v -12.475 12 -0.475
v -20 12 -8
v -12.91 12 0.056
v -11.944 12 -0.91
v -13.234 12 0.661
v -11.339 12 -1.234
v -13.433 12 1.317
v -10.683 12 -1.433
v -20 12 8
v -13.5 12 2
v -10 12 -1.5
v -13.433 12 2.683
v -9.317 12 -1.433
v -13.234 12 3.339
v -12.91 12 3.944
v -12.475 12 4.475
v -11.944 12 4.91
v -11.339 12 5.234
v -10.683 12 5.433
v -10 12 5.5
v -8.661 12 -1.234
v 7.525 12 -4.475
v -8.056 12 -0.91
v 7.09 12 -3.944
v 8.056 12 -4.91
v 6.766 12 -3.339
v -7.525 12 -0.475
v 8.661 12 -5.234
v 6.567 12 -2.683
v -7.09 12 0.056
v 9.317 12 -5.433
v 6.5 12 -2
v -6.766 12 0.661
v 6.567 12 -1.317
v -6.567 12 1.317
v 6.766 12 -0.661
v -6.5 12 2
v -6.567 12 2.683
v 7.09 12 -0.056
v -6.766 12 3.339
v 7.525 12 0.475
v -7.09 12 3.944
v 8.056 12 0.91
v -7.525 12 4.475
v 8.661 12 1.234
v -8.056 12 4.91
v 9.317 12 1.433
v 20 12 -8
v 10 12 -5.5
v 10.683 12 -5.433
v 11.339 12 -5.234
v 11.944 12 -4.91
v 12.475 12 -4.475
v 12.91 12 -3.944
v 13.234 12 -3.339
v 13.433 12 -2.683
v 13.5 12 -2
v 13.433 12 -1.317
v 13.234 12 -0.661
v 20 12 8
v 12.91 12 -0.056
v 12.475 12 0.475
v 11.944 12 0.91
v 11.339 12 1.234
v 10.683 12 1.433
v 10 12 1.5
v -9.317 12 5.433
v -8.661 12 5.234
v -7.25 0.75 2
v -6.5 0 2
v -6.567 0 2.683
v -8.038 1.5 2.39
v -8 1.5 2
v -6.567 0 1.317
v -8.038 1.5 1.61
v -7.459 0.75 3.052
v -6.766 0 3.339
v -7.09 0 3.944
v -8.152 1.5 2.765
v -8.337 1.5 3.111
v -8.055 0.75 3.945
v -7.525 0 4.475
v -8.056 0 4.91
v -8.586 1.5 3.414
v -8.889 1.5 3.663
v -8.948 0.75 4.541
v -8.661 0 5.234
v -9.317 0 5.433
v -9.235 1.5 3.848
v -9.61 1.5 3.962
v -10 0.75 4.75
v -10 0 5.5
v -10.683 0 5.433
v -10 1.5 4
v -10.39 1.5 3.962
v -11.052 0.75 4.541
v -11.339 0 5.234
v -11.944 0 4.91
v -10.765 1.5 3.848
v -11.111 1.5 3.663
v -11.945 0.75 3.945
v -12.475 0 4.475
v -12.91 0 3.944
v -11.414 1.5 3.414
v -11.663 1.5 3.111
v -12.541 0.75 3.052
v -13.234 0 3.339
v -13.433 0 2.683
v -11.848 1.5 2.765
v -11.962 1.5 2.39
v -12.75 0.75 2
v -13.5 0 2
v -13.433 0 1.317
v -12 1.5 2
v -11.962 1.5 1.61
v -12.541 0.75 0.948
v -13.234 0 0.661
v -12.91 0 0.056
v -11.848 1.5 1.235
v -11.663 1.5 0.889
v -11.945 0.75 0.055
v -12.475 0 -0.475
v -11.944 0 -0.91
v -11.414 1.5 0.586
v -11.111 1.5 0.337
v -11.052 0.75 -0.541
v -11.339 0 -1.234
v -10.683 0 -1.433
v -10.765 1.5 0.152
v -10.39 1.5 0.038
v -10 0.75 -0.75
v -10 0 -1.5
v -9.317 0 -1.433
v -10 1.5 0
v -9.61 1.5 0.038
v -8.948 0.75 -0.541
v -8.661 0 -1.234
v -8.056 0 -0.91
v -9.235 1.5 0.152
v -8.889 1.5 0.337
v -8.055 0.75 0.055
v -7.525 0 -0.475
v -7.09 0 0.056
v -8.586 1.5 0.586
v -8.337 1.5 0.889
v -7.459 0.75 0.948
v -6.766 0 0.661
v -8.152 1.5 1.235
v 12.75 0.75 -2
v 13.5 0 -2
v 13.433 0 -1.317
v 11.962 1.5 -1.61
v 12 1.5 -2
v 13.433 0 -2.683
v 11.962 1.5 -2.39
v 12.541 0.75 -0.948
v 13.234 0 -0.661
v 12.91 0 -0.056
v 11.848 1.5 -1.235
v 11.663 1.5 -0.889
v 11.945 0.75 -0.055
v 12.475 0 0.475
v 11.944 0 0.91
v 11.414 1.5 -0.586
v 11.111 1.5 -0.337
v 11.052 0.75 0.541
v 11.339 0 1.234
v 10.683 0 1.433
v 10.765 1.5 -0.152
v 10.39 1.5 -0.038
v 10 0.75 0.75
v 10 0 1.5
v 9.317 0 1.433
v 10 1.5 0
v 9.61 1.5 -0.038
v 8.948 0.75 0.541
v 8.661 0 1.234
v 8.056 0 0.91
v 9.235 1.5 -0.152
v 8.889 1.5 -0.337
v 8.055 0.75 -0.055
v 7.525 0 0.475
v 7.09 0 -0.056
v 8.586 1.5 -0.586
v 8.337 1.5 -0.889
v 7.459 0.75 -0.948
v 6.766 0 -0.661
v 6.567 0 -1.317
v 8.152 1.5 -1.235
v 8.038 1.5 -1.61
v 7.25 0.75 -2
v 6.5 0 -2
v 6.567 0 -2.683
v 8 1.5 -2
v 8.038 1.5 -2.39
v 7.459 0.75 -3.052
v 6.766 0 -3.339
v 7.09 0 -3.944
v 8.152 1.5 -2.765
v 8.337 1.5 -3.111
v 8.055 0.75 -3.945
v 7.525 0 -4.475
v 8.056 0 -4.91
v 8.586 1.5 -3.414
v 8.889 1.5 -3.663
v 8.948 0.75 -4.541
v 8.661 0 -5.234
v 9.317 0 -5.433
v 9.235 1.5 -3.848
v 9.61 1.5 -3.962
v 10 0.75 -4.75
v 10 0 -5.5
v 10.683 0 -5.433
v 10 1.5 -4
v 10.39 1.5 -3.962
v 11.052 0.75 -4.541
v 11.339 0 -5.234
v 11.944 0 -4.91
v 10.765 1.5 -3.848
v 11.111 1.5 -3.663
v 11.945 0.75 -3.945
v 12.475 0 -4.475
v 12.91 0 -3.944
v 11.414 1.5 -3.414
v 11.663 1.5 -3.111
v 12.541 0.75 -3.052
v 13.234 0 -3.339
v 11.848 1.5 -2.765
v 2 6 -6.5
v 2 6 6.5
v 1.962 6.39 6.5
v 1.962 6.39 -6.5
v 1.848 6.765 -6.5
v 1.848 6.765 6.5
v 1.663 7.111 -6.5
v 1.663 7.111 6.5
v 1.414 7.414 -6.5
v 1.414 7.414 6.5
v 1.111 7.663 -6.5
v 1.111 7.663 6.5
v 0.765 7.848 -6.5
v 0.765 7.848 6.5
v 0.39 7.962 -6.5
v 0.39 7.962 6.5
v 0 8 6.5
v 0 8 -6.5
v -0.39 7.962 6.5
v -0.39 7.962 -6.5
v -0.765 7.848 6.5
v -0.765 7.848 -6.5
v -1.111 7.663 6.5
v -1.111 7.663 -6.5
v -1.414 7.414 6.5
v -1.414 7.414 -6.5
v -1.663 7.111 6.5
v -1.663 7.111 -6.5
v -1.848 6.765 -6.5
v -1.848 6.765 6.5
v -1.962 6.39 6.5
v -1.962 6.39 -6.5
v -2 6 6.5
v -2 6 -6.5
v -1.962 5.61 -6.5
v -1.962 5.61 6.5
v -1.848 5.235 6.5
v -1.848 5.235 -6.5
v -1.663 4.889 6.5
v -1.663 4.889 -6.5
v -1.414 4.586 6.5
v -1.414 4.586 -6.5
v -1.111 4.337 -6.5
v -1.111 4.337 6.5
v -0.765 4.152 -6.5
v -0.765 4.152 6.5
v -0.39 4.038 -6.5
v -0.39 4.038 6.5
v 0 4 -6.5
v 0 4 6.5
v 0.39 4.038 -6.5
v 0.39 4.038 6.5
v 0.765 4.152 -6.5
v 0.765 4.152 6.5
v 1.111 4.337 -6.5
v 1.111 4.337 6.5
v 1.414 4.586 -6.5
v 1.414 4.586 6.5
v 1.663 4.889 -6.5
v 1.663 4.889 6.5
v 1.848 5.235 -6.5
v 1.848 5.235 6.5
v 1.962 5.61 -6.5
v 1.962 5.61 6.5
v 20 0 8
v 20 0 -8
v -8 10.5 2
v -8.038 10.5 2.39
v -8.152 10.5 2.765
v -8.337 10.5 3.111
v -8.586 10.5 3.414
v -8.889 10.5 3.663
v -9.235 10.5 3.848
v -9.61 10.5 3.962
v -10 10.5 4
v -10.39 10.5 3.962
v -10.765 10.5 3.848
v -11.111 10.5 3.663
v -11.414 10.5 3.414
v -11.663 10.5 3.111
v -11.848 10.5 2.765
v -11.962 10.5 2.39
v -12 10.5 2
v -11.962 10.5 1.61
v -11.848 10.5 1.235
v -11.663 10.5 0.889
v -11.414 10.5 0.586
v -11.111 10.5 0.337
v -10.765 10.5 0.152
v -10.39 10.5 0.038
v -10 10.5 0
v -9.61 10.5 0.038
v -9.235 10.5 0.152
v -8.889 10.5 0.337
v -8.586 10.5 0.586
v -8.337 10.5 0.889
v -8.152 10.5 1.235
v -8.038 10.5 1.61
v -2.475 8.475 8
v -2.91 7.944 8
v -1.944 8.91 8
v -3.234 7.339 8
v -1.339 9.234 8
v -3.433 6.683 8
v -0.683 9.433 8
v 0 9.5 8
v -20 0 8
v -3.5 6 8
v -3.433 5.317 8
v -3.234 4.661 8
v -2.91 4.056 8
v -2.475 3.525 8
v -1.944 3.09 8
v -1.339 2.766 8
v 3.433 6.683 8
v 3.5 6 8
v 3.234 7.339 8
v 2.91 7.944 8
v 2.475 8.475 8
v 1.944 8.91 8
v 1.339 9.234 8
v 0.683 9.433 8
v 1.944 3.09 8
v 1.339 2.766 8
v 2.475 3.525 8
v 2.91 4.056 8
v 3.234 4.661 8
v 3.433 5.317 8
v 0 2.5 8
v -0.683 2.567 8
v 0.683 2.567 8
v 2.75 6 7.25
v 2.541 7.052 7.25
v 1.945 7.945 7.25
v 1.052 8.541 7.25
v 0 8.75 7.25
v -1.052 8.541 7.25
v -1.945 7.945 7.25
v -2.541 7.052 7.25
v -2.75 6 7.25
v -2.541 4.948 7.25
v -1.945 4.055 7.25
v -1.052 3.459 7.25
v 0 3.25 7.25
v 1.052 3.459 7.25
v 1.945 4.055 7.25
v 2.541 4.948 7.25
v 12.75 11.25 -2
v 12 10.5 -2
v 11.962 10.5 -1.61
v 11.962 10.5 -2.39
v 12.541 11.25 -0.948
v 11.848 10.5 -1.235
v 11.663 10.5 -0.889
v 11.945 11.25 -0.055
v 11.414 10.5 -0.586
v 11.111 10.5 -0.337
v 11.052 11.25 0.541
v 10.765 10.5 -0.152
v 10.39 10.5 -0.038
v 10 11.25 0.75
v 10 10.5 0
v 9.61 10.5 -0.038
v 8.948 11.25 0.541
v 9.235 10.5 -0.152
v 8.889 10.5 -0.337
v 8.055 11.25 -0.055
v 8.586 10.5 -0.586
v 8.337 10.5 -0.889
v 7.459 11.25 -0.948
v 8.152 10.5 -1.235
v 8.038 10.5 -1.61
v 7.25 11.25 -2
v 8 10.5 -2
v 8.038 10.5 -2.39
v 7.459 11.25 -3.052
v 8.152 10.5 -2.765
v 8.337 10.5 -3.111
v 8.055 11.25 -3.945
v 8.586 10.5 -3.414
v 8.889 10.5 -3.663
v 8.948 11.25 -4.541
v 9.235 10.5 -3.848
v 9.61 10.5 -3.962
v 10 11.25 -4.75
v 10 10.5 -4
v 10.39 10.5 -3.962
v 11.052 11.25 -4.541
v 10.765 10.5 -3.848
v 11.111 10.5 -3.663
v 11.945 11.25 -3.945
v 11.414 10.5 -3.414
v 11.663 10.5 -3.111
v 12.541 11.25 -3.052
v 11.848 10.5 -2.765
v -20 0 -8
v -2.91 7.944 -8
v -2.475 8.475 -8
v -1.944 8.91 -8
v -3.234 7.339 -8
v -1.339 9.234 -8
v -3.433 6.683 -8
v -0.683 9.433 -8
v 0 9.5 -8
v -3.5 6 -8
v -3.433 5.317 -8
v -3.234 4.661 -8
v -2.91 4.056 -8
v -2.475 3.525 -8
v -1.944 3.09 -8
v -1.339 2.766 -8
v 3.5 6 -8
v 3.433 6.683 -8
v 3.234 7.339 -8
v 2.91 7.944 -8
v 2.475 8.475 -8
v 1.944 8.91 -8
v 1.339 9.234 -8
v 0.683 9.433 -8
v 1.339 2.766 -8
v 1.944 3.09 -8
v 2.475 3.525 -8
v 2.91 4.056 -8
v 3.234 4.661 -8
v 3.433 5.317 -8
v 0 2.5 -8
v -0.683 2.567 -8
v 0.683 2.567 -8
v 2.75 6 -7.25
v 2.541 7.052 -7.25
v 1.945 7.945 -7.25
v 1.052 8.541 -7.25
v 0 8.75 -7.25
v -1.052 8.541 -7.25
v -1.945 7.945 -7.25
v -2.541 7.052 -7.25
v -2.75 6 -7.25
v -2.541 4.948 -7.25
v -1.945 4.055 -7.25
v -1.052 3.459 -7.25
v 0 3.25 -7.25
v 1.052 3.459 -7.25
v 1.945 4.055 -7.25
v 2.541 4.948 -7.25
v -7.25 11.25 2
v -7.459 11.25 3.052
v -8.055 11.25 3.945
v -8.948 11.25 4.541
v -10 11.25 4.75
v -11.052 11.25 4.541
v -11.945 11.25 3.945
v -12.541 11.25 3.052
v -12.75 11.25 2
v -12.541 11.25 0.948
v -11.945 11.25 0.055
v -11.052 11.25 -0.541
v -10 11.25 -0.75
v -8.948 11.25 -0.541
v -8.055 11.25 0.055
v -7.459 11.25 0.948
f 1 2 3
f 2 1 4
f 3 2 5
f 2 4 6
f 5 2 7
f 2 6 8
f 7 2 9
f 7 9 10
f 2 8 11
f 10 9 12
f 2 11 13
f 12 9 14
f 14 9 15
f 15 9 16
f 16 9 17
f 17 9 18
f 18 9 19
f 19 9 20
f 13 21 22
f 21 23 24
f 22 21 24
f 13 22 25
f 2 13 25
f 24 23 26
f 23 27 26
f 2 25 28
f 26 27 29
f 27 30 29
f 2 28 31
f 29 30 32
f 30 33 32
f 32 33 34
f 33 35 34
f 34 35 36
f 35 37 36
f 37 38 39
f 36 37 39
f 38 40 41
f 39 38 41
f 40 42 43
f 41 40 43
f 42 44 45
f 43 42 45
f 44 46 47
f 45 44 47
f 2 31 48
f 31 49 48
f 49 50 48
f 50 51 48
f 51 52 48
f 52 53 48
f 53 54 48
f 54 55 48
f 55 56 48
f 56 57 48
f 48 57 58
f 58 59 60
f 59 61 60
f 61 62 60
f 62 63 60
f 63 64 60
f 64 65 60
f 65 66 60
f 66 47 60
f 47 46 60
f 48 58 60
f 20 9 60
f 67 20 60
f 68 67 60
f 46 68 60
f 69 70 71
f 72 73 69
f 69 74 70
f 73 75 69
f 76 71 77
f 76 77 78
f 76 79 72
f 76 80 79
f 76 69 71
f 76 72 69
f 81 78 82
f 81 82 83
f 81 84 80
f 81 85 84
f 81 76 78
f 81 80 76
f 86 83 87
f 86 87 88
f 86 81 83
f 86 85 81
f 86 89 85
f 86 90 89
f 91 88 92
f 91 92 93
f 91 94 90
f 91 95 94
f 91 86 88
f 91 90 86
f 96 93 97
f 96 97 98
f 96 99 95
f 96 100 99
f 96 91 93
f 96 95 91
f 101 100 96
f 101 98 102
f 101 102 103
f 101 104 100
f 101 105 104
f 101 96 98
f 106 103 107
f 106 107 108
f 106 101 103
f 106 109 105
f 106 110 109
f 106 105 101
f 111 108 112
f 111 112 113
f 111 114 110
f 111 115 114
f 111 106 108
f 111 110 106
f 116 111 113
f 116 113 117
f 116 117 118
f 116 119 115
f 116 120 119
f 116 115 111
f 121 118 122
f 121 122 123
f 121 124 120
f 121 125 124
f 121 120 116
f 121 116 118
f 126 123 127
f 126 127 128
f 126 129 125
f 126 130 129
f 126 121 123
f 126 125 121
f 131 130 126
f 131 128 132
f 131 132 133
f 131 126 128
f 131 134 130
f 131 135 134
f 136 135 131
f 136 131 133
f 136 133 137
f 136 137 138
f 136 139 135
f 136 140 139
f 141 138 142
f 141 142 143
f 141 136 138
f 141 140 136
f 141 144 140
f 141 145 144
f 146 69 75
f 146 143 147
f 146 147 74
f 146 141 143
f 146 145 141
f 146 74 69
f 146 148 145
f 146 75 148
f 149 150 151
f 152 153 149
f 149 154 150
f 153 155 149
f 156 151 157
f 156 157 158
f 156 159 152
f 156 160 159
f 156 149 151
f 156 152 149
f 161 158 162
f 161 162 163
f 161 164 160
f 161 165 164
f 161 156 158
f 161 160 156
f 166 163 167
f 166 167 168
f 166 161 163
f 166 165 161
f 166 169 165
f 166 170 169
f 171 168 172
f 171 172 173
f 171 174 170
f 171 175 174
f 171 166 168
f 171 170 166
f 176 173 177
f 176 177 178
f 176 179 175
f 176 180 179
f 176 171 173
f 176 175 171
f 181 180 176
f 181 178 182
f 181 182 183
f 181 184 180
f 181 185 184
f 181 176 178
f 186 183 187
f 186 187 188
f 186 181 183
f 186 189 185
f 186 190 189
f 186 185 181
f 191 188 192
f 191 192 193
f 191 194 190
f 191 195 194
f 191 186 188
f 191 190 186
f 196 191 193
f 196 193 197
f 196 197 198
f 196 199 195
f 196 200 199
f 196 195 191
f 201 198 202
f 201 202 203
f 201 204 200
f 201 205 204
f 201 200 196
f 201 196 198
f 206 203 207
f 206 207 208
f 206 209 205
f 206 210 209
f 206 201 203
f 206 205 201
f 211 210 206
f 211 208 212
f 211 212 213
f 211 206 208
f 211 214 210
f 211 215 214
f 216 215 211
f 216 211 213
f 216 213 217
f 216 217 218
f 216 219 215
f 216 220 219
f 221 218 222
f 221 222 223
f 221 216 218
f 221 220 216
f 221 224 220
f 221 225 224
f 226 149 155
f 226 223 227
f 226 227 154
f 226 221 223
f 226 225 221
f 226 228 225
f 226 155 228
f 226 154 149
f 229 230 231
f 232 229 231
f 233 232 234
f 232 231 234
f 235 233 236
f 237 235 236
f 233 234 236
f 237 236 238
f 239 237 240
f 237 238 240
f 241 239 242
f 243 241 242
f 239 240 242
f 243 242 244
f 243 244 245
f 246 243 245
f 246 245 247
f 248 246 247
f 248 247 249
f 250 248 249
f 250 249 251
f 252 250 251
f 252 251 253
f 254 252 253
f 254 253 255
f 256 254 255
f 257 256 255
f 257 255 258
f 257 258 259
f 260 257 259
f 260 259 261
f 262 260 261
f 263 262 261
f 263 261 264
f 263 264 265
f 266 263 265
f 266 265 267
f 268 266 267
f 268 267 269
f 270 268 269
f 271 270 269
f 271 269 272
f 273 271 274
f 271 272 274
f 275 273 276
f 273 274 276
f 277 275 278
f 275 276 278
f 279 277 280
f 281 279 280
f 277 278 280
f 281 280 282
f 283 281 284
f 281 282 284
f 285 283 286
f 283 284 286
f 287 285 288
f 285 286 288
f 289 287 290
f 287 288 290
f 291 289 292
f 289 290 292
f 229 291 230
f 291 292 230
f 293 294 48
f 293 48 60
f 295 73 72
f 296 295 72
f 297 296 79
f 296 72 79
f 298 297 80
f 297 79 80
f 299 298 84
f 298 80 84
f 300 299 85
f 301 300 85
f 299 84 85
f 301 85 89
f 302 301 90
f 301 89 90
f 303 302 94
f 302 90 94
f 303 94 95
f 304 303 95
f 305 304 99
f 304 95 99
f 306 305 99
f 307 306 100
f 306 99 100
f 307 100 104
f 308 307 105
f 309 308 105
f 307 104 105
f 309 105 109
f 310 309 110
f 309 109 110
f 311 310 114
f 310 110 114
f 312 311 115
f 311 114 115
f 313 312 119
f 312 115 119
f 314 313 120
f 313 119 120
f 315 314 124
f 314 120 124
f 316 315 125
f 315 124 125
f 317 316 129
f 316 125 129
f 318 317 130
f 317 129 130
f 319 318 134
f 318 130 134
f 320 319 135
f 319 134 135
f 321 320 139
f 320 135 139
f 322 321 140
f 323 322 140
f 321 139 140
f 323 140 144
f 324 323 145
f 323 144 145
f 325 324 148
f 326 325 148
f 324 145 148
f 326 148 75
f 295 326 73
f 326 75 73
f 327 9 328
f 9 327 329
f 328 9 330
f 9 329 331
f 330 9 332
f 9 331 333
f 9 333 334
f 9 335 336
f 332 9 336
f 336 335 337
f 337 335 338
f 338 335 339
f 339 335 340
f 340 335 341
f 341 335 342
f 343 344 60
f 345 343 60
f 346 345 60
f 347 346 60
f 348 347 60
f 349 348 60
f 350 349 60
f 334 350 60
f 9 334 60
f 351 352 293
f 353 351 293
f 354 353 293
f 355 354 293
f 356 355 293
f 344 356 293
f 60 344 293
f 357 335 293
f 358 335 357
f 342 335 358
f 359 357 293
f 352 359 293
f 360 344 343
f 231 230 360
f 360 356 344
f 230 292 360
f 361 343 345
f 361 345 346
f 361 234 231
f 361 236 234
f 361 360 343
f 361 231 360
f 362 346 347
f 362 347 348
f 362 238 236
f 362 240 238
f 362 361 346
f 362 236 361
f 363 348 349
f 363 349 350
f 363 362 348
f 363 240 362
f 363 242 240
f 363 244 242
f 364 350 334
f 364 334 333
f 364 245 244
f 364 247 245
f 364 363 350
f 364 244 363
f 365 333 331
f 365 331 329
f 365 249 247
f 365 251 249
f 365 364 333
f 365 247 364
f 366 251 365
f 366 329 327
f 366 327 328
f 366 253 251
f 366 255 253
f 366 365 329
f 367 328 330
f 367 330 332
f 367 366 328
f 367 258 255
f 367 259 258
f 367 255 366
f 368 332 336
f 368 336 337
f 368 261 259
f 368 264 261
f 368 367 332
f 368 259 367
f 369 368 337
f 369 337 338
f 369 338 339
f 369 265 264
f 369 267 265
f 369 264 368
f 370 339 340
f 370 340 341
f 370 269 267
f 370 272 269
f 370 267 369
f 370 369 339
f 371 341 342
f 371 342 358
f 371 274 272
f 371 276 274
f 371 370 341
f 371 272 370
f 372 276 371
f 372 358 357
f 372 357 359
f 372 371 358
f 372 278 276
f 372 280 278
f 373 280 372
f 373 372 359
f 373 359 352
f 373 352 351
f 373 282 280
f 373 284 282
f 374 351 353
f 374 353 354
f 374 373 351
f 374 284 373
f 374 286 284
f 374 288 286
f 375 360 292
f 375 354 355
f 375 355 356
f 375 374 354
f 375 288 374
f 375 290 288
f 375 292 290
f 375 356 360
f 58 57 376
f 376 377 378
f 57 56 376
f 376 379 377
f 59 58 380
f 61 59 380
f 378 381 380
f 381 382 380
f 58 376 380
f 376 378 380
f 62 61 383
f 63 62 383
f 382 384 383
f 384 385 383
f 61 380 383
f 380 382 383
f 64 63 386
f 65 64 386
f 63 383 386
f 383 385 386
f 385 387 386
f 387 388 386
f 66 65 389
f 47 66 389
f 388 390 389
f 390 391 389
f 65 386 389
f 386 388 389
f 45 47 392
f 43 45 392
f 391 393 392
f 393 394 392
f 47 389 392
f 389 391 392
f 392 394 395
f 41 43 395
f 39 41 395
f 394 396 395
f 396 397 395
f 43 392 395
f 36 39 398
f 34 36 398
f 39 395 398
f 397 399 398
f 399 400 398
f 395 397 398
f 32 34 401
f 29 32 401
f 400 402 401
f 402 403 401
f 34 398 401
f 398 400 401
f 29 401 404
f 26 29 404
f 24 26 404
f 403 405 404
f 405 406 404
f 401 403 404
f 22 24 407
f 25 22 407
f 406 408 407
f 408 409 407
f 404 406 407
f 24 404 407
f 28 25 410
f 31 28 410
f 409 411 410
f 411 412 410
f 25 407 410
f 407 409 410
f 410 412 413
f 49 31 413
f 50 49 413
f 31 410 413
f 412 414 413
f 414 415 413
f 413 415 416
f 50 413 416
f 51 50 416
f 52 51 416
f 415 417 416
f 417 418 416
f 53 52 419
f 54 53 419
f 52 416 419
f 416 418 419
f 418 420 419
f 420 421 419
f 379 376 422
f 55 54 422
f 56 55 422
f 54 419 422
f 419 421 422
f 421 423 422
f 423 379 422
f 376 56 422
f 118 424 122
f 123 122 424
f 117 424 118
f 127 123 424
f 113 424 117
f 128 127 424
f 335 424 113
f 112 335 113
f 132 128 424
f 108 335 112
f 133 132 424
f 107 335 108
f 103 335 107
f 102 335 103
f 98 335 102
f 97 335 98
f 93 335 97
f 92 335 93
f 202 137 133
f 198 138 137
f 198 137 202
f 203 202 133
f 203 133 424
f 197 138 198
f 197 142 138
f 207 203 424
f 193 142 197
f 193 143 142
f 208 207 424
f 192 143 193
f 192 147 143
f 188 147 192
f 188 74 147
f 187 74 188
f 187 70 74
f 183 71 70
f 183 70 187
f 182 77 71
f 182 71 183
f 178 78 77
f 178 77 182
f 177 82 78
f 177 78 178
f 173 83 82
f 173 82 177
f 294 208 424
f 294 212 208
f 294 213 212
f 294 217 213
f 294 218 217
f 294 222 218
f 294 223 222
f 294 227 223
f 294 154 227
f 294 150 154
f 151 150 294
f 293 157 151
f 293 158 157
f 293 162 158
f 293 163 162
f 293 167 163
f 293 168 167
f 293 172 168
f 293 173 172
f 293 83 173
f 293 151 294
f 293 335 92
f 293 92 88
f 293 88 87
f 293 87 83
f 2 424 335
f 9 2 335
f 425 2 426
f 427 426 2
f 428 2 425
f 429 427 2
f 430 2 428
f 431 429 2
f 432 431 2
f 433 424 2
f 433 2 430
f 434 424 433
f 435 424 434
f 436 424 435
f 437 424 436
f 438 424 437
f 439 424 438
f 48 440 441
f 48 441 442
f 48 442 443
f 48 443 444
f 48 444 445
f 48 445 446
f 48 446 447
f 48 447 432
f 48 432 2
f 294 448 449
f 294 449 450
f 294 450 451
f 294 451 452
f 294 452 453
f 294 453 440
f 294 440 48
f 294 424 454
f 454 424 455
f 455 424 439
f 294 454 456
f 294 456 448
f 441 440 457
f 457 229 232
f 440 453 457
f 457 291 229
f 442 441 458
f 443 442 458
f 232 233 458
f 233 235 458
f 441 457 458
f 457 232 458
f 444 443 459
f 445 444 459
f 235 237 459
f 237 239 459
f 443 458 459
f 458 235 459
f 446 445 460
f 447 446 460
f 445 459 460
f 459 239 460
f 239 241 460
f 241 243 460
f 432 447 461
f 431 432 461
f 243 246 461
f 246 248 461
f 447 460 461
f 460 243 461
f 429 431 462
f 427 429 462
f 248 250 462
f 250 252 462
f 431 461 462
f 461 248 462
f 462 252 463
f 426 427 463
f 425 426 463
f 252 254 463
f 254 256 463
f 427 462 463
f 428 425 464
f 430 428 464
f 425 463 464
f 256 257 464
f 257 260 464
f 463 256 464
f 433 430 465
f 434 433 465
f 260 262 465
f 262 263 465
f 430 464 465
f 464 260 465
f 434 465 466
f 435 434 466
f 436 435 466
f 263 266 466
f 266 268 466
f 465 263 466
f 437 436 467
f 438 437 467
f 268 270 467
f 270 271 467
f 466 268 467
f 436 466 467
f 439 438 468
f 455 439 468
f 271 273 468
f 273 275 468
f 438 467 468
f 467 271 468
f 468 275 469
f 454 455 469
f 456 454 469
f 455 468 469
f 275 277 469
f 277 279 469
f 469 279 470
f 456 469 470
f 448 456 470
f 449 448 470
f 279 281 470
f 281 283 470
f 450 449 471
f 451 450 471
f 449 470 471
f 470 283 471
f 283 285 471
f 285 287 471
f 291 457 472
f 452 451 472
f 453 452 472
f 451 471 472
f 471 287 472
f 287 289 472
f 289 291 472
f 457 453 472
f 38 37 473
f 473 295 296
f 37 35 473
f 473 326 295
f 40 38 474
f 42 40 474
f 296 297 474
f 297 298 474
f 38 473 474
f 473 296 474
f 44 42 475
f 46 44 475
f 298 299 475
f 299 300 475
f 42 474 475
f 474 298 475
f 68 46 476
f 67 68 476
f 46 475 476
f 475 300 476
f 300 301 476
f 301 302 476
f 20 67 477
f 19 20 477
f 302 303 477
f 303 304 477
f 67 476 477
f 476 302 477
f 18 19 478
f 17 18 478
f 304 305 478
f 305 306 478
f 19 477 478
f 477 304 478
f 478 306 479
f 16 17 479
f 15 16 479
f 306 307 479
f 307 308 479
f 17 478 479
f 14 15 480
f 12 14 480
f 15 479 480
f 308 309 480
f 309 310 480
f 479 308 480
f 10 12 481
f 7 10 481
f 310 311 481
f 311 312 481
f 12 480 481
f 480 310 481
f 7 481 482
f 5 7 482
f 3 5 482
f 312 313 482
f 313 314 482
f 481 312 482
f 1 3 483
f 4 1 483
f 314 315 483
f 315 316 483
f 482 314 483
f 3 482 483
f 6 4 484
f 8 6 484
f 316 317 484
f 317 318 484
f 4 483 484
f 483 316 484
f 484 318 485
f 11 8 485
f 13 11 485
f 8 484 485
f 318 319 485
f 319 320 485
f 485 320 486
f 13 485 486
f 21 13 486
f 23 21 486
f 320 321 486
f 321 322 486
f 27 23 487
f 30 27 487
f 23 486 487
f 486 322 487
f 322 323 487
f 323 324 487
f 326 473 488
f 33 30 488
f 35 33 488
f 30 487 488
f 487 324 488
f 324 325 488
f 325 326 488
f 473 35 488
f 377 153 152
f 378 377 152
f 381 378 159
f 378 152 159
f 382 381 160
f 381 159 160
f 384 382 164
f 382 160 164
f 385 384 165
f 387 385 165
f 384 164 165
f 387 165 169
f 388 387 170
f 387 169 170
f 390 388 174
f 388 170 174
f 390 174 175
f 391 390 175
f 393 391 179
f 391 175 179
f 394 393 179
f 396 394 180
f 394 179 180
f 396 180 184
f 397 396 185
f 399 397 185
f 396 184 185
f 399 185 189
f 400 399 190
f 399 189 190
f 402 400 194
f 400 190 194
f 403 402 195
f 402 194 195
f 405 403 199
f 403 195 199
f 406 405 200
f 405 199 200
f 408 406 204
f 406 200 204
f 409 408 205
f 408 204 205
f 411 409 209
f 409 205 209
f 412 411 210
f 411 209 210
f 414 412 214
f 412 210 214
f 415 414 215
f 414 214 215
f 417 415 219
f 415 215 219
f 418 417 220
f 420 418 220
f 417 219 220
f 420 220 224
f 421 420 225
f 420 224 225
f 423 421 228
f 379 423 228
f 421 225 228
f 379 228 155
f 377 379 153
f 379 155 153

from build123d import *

# Parameters (mm, degrees)
F0_W     = 40
F0_H     = 16
F0_R     = 2
F1_DEPTH = 12
F2_R     = 2
F3_DEPTH = 16.001
F4_SIZE  = 1.5


with BuildPart() as f1:
    # F0 (on Front) → F1 (new body)
    with BuildSketch(Plane.XZ):
        Rectangle(F0_W, F0_H)
        with Locations((10, -2)):
            Circle(F0_R, mode=Mode.SUBTRACT)
        with Locations((-10, 2)):
            Circle(F0_R, mode=Mode.SUBTRACT)
    extrude(amount=-F1_DEPTH)

    # F2 (on face) → F3 (cut, through all)
    with BuildSketch(Plane.XY.offset(8)):
        with Locations((0, 6)):
            Circle(F2_R)
    extrude(amount=-F3_DEPTH, mode=Mode.SUBTRACT)

    # F4
    f4_edges = [f1.edges().sort_by_distance(p)[0] for p in [
        (-12, 12, 2),
        (8, 12, -2),
        (-12, 0, 2),
        (8, 0, -2),
        (-2, 6, 8),
        (-2, 6, -8),
    ]]
    chamfer(f4_edges, length=F4_SIZE)


solid = f1.part
